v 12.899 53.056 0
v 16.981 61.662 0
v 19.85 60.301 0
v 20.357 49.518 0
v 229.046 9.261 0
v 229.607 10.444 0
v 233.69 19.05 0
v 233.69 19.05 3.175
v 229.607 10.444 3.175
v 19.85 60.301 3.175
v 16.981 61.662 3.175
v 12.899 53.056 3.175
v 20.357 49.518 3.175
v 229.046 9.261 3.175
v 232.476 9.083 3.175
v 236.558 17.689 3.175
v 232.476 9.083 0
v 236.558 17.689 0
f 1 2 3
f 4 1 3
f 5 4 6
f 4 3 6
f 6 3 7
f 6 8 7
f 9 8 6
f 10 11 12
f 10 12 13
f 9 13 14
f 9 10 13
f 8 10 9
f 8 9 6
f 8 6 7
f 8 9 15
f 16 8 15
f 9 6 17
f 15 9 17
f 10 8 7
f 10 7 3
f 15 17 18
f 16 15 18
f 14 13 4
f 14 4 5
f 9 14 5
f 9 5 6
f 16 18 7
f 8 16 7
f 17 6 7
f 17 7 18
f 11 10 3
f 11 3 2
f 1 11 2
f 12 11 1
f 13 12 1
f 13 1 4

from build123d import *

# Parameters (mm, degrees)
BOSS_EXTRUDE1_DEPTH = 3.175
CUT_EXTRUDE1_DEPTH  = 238.449079666
CUT_EXTRUDE2_DEPTH  = 238.449079666
CUT_EXTRUDE3_DEPTH  = 238.449079666
BOSS_EXTRUDE2_DEPTH = 3.175


with BuildPart() as part:
    # Sketch1 → Boss-Extrude1 (new body)
    with BuildSketch(Plane.XY):
        Polygon((233.689675114, 19.05), (0, 19.05), (-2.639109482, 20.301935358), (-6.721507389, 11.696143569), (-4.082397907, 10.44420821), (-7.376853836, 3.499416834), (0, 0), (224.652775078, 0), (224.700845079, 0.101332705), (116.204157045, 1.003029976), (116.204399748, 1.032233261), (224.714645025, 0.130423318), (229.607277207, 10.44420821), (232.47587447, 9.083408908), (236.558272377, 17.689200698), align=None)
    extrude(amount=BOSS_EXTRUDE1_DEPTH)

    # Sketch2 → Cut-Extrude1 (cut, through all)
    with BuildSketch(Plane.XY.offset(3.175)):
        Polygon((-7.376853836, 9.525), (-7.376853836, 0), (236.558272377, 0), (236.558272377, 4.7625), (229.171225096, 9.525), align=None)
    extrude(amount=-CUT_EXTRUDE1_DEPTH, mode=Mode.SUBTRACT)

    # Sketch3 → Cut-Extrude2 (cut, through all)
    with BuildSketch(Plane.XY.offset(3.175)):
        Polygon((-4.082397907, 10.44420821), (-4.518450018, 9.525), (-2.144685159, 9.525), align=None)
    extrude(amount=-CUT_EXTRUDE2_DEPTH, mode=Mode.SUBTRACT)

    # Sketch4 → Cut-Extrude3 (cut, through all)
    with BuildSketch(Plane.XY.offset(3.175)):
        Polygon((-6.721507389, 11.696143569), (40.288847635, 110.795088966), (233.689675114, 19.05), (186.679320089, -80.048945397), align=None)
    extrude(amount=-CUT_EXTRUDE3_DEPTH, mode=Mode.SUBTRACT)


with BuildPart() as body_2:
    # Sketch5 → Boss-Extrude2 (new body)
    with BuildSketch(Plane.XY.offset(3.175)):
        Polygon((233.689675114, 19.05), (19.849708932, 60.30093938), (16.981111669, 61.661738682), (12.898713762, 53.055946892), (20.357066646, 49.517868706), (229.045813198, 9.260628739), (229.607277207, 10.44420821), align=None)
    extrude(amount=-BOSS_EXTRUDE2_DEPTH)


solid = Compound([part.part, body_2.part])
